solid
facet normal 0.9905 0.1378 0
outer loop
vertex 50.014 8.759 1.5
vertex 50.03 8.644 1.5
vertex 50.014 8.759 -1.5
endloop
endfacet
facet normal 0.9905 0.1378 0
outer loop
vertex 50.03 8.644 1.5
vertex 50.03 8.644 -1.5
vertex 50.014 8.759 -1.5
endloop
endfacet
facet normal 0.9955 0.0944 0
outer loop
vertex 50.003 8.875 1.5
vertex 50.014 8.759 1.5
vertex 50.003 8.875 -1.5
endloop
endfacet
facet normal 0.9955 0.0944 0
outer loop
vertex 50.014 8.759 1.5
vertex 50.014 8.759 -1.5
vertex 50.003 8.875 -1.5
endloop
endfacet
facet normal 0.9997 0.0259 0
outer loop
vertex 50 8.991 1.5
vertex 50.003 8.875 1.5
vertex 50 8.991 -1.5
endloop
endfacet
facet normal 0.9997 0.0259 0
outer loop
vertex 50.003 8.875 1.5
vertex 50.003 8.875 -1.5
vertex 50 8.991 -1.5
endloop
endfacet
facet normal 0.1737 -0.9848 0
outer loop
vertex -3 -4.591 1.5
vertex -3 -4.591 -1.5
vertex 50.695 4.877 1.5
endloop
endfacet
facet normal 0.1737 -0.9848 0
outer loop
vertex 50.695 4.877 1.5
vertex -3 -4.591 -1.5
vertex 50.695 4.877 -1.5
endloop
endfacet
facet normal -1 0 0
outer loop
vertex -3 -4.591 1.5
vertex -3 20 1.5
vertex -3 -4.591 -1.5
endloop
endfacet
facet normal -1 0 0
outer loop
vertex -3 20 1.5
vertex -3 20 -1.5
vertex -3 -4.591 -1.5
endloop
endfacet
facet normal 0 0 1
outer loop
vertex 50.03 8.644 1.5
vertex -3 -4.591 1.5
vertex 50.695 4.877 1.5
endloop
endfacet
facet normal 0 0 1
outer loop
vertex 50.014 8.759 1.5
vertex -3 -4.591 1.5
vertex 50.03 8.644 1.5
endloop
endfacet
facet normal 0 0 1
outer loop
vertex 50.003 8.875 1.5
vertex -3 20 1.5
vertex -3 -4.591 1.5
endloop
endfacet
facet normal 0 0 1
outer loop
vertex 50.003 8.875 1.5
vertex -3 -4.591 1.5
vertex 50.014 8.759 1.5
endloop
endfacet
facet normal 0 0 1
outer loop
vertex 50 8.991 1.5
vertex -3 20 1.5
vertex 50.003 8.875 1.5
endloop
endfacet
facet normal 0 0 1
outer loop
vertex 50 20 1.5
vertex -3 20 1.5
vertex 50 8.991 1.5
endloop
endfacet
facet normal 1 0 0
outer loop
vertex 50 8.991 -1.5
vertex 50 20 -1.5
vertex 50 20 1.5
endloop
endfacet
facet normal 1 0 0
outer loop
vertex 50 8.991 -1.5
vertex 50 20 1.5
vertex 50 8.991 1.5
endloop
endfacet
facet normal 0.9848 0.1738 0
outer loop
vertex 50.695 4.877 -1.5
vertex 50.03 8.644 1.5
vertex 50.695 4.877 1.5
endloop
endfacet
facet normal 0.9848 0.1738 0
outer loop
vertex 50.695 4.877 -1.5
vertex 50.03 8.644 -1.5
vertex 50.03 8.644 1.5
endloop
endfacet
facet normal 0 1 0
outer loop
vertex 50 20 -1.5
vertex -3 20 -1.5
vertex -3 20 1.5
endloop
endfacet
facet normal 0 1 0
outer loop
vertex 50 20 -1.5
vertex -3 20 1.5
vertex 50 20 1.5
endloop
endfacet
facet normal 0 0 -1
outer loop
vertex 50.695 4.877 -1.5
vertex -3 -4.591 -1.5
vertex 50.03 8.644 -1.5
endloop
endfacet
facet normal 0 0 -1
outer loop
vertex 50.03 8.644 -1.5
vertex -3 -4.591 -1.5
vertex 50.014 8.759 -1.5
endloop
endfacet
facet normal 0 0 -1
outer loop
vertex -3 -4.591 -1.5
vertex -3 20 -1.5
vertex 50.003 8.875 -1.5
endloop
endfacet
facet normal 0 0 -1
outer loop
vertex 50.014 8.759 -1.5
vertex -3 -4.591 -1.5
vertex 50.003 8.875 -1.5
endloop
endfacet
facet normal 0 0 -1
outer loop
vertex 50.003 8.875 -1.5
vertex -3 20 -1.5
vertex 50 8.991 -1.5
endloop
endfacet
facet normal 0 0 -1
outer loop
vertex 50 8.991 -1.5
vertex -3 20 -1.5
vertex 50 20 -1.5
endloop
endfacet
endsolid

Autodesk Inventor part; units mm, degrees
ref_plane "YZ Plane" through (0, 0, 0) normal (1, 0, 0) x (0, 1, 0)
ref_plane "XZ Plane" through (0, 0, 0) normal (0, 1, 0) x (-1, 0, 0)
ref_plane "XY Plane" through (0, 0, 0) normal (0, 0, 1) x (1, 0, 0)
sketch "Sketch1" plane through (0, 0, 0) normal (0, 0, 1) x (1, 0, 0)
  line L0 (0, 20) -> (0, 0)
  line L1 (0, 0) -> (50, 8.8163)
  line L2 (0, 20) -> (-3, 20)
  line L3 (-3, 20) -> (-3, -4.5907)
  line L4 (-3, -4.5907) -> (50.6946, 4.8771)
  line L5 (0, 0) -> (50.6946, 0) construction
  line L6 (50, 8.8163) -> (50.6946, 4.8771)
  line L7 (0, 20) -> (50, 20)
  line L8 (50, 20) -> (50, 8.8163)
  line L9 (50.3473, 6.8467) -> (11.5175, 0) construction
  dimension "d0" = 20
  dimension "d1" = 3
  dimension "d2" = 10
  dimension "d3" = 4
  dimension "d4" = 50
extrude "Plate1" add sketch "Sketch1" along normal mid plane 3
fillet "Corner Round1" radius 2 1 edges at (50, 8.8163, 0)
equation "\"d5\" = Thickness"
equation "\"BendRadius\" = Thickness"
equation "\"BendReliefWidth\" = Thickness"
equation "\"BendReliefDepth\" = 0.5 * Thickness"
equation "\"CornerReliefSize\" = 4 * Thickness"
equation "\"MinimumRemnant\" = 2 * Thickness"
equation "\"TransitionRadius\" = BendRadius"
equation "\"JacobiRadiusSize\" = BendRadius"
equation "\"GapSize\" = Thickness"
equation "\"Thickness\" = 3"
properties part number "Ramp Side Wall"
